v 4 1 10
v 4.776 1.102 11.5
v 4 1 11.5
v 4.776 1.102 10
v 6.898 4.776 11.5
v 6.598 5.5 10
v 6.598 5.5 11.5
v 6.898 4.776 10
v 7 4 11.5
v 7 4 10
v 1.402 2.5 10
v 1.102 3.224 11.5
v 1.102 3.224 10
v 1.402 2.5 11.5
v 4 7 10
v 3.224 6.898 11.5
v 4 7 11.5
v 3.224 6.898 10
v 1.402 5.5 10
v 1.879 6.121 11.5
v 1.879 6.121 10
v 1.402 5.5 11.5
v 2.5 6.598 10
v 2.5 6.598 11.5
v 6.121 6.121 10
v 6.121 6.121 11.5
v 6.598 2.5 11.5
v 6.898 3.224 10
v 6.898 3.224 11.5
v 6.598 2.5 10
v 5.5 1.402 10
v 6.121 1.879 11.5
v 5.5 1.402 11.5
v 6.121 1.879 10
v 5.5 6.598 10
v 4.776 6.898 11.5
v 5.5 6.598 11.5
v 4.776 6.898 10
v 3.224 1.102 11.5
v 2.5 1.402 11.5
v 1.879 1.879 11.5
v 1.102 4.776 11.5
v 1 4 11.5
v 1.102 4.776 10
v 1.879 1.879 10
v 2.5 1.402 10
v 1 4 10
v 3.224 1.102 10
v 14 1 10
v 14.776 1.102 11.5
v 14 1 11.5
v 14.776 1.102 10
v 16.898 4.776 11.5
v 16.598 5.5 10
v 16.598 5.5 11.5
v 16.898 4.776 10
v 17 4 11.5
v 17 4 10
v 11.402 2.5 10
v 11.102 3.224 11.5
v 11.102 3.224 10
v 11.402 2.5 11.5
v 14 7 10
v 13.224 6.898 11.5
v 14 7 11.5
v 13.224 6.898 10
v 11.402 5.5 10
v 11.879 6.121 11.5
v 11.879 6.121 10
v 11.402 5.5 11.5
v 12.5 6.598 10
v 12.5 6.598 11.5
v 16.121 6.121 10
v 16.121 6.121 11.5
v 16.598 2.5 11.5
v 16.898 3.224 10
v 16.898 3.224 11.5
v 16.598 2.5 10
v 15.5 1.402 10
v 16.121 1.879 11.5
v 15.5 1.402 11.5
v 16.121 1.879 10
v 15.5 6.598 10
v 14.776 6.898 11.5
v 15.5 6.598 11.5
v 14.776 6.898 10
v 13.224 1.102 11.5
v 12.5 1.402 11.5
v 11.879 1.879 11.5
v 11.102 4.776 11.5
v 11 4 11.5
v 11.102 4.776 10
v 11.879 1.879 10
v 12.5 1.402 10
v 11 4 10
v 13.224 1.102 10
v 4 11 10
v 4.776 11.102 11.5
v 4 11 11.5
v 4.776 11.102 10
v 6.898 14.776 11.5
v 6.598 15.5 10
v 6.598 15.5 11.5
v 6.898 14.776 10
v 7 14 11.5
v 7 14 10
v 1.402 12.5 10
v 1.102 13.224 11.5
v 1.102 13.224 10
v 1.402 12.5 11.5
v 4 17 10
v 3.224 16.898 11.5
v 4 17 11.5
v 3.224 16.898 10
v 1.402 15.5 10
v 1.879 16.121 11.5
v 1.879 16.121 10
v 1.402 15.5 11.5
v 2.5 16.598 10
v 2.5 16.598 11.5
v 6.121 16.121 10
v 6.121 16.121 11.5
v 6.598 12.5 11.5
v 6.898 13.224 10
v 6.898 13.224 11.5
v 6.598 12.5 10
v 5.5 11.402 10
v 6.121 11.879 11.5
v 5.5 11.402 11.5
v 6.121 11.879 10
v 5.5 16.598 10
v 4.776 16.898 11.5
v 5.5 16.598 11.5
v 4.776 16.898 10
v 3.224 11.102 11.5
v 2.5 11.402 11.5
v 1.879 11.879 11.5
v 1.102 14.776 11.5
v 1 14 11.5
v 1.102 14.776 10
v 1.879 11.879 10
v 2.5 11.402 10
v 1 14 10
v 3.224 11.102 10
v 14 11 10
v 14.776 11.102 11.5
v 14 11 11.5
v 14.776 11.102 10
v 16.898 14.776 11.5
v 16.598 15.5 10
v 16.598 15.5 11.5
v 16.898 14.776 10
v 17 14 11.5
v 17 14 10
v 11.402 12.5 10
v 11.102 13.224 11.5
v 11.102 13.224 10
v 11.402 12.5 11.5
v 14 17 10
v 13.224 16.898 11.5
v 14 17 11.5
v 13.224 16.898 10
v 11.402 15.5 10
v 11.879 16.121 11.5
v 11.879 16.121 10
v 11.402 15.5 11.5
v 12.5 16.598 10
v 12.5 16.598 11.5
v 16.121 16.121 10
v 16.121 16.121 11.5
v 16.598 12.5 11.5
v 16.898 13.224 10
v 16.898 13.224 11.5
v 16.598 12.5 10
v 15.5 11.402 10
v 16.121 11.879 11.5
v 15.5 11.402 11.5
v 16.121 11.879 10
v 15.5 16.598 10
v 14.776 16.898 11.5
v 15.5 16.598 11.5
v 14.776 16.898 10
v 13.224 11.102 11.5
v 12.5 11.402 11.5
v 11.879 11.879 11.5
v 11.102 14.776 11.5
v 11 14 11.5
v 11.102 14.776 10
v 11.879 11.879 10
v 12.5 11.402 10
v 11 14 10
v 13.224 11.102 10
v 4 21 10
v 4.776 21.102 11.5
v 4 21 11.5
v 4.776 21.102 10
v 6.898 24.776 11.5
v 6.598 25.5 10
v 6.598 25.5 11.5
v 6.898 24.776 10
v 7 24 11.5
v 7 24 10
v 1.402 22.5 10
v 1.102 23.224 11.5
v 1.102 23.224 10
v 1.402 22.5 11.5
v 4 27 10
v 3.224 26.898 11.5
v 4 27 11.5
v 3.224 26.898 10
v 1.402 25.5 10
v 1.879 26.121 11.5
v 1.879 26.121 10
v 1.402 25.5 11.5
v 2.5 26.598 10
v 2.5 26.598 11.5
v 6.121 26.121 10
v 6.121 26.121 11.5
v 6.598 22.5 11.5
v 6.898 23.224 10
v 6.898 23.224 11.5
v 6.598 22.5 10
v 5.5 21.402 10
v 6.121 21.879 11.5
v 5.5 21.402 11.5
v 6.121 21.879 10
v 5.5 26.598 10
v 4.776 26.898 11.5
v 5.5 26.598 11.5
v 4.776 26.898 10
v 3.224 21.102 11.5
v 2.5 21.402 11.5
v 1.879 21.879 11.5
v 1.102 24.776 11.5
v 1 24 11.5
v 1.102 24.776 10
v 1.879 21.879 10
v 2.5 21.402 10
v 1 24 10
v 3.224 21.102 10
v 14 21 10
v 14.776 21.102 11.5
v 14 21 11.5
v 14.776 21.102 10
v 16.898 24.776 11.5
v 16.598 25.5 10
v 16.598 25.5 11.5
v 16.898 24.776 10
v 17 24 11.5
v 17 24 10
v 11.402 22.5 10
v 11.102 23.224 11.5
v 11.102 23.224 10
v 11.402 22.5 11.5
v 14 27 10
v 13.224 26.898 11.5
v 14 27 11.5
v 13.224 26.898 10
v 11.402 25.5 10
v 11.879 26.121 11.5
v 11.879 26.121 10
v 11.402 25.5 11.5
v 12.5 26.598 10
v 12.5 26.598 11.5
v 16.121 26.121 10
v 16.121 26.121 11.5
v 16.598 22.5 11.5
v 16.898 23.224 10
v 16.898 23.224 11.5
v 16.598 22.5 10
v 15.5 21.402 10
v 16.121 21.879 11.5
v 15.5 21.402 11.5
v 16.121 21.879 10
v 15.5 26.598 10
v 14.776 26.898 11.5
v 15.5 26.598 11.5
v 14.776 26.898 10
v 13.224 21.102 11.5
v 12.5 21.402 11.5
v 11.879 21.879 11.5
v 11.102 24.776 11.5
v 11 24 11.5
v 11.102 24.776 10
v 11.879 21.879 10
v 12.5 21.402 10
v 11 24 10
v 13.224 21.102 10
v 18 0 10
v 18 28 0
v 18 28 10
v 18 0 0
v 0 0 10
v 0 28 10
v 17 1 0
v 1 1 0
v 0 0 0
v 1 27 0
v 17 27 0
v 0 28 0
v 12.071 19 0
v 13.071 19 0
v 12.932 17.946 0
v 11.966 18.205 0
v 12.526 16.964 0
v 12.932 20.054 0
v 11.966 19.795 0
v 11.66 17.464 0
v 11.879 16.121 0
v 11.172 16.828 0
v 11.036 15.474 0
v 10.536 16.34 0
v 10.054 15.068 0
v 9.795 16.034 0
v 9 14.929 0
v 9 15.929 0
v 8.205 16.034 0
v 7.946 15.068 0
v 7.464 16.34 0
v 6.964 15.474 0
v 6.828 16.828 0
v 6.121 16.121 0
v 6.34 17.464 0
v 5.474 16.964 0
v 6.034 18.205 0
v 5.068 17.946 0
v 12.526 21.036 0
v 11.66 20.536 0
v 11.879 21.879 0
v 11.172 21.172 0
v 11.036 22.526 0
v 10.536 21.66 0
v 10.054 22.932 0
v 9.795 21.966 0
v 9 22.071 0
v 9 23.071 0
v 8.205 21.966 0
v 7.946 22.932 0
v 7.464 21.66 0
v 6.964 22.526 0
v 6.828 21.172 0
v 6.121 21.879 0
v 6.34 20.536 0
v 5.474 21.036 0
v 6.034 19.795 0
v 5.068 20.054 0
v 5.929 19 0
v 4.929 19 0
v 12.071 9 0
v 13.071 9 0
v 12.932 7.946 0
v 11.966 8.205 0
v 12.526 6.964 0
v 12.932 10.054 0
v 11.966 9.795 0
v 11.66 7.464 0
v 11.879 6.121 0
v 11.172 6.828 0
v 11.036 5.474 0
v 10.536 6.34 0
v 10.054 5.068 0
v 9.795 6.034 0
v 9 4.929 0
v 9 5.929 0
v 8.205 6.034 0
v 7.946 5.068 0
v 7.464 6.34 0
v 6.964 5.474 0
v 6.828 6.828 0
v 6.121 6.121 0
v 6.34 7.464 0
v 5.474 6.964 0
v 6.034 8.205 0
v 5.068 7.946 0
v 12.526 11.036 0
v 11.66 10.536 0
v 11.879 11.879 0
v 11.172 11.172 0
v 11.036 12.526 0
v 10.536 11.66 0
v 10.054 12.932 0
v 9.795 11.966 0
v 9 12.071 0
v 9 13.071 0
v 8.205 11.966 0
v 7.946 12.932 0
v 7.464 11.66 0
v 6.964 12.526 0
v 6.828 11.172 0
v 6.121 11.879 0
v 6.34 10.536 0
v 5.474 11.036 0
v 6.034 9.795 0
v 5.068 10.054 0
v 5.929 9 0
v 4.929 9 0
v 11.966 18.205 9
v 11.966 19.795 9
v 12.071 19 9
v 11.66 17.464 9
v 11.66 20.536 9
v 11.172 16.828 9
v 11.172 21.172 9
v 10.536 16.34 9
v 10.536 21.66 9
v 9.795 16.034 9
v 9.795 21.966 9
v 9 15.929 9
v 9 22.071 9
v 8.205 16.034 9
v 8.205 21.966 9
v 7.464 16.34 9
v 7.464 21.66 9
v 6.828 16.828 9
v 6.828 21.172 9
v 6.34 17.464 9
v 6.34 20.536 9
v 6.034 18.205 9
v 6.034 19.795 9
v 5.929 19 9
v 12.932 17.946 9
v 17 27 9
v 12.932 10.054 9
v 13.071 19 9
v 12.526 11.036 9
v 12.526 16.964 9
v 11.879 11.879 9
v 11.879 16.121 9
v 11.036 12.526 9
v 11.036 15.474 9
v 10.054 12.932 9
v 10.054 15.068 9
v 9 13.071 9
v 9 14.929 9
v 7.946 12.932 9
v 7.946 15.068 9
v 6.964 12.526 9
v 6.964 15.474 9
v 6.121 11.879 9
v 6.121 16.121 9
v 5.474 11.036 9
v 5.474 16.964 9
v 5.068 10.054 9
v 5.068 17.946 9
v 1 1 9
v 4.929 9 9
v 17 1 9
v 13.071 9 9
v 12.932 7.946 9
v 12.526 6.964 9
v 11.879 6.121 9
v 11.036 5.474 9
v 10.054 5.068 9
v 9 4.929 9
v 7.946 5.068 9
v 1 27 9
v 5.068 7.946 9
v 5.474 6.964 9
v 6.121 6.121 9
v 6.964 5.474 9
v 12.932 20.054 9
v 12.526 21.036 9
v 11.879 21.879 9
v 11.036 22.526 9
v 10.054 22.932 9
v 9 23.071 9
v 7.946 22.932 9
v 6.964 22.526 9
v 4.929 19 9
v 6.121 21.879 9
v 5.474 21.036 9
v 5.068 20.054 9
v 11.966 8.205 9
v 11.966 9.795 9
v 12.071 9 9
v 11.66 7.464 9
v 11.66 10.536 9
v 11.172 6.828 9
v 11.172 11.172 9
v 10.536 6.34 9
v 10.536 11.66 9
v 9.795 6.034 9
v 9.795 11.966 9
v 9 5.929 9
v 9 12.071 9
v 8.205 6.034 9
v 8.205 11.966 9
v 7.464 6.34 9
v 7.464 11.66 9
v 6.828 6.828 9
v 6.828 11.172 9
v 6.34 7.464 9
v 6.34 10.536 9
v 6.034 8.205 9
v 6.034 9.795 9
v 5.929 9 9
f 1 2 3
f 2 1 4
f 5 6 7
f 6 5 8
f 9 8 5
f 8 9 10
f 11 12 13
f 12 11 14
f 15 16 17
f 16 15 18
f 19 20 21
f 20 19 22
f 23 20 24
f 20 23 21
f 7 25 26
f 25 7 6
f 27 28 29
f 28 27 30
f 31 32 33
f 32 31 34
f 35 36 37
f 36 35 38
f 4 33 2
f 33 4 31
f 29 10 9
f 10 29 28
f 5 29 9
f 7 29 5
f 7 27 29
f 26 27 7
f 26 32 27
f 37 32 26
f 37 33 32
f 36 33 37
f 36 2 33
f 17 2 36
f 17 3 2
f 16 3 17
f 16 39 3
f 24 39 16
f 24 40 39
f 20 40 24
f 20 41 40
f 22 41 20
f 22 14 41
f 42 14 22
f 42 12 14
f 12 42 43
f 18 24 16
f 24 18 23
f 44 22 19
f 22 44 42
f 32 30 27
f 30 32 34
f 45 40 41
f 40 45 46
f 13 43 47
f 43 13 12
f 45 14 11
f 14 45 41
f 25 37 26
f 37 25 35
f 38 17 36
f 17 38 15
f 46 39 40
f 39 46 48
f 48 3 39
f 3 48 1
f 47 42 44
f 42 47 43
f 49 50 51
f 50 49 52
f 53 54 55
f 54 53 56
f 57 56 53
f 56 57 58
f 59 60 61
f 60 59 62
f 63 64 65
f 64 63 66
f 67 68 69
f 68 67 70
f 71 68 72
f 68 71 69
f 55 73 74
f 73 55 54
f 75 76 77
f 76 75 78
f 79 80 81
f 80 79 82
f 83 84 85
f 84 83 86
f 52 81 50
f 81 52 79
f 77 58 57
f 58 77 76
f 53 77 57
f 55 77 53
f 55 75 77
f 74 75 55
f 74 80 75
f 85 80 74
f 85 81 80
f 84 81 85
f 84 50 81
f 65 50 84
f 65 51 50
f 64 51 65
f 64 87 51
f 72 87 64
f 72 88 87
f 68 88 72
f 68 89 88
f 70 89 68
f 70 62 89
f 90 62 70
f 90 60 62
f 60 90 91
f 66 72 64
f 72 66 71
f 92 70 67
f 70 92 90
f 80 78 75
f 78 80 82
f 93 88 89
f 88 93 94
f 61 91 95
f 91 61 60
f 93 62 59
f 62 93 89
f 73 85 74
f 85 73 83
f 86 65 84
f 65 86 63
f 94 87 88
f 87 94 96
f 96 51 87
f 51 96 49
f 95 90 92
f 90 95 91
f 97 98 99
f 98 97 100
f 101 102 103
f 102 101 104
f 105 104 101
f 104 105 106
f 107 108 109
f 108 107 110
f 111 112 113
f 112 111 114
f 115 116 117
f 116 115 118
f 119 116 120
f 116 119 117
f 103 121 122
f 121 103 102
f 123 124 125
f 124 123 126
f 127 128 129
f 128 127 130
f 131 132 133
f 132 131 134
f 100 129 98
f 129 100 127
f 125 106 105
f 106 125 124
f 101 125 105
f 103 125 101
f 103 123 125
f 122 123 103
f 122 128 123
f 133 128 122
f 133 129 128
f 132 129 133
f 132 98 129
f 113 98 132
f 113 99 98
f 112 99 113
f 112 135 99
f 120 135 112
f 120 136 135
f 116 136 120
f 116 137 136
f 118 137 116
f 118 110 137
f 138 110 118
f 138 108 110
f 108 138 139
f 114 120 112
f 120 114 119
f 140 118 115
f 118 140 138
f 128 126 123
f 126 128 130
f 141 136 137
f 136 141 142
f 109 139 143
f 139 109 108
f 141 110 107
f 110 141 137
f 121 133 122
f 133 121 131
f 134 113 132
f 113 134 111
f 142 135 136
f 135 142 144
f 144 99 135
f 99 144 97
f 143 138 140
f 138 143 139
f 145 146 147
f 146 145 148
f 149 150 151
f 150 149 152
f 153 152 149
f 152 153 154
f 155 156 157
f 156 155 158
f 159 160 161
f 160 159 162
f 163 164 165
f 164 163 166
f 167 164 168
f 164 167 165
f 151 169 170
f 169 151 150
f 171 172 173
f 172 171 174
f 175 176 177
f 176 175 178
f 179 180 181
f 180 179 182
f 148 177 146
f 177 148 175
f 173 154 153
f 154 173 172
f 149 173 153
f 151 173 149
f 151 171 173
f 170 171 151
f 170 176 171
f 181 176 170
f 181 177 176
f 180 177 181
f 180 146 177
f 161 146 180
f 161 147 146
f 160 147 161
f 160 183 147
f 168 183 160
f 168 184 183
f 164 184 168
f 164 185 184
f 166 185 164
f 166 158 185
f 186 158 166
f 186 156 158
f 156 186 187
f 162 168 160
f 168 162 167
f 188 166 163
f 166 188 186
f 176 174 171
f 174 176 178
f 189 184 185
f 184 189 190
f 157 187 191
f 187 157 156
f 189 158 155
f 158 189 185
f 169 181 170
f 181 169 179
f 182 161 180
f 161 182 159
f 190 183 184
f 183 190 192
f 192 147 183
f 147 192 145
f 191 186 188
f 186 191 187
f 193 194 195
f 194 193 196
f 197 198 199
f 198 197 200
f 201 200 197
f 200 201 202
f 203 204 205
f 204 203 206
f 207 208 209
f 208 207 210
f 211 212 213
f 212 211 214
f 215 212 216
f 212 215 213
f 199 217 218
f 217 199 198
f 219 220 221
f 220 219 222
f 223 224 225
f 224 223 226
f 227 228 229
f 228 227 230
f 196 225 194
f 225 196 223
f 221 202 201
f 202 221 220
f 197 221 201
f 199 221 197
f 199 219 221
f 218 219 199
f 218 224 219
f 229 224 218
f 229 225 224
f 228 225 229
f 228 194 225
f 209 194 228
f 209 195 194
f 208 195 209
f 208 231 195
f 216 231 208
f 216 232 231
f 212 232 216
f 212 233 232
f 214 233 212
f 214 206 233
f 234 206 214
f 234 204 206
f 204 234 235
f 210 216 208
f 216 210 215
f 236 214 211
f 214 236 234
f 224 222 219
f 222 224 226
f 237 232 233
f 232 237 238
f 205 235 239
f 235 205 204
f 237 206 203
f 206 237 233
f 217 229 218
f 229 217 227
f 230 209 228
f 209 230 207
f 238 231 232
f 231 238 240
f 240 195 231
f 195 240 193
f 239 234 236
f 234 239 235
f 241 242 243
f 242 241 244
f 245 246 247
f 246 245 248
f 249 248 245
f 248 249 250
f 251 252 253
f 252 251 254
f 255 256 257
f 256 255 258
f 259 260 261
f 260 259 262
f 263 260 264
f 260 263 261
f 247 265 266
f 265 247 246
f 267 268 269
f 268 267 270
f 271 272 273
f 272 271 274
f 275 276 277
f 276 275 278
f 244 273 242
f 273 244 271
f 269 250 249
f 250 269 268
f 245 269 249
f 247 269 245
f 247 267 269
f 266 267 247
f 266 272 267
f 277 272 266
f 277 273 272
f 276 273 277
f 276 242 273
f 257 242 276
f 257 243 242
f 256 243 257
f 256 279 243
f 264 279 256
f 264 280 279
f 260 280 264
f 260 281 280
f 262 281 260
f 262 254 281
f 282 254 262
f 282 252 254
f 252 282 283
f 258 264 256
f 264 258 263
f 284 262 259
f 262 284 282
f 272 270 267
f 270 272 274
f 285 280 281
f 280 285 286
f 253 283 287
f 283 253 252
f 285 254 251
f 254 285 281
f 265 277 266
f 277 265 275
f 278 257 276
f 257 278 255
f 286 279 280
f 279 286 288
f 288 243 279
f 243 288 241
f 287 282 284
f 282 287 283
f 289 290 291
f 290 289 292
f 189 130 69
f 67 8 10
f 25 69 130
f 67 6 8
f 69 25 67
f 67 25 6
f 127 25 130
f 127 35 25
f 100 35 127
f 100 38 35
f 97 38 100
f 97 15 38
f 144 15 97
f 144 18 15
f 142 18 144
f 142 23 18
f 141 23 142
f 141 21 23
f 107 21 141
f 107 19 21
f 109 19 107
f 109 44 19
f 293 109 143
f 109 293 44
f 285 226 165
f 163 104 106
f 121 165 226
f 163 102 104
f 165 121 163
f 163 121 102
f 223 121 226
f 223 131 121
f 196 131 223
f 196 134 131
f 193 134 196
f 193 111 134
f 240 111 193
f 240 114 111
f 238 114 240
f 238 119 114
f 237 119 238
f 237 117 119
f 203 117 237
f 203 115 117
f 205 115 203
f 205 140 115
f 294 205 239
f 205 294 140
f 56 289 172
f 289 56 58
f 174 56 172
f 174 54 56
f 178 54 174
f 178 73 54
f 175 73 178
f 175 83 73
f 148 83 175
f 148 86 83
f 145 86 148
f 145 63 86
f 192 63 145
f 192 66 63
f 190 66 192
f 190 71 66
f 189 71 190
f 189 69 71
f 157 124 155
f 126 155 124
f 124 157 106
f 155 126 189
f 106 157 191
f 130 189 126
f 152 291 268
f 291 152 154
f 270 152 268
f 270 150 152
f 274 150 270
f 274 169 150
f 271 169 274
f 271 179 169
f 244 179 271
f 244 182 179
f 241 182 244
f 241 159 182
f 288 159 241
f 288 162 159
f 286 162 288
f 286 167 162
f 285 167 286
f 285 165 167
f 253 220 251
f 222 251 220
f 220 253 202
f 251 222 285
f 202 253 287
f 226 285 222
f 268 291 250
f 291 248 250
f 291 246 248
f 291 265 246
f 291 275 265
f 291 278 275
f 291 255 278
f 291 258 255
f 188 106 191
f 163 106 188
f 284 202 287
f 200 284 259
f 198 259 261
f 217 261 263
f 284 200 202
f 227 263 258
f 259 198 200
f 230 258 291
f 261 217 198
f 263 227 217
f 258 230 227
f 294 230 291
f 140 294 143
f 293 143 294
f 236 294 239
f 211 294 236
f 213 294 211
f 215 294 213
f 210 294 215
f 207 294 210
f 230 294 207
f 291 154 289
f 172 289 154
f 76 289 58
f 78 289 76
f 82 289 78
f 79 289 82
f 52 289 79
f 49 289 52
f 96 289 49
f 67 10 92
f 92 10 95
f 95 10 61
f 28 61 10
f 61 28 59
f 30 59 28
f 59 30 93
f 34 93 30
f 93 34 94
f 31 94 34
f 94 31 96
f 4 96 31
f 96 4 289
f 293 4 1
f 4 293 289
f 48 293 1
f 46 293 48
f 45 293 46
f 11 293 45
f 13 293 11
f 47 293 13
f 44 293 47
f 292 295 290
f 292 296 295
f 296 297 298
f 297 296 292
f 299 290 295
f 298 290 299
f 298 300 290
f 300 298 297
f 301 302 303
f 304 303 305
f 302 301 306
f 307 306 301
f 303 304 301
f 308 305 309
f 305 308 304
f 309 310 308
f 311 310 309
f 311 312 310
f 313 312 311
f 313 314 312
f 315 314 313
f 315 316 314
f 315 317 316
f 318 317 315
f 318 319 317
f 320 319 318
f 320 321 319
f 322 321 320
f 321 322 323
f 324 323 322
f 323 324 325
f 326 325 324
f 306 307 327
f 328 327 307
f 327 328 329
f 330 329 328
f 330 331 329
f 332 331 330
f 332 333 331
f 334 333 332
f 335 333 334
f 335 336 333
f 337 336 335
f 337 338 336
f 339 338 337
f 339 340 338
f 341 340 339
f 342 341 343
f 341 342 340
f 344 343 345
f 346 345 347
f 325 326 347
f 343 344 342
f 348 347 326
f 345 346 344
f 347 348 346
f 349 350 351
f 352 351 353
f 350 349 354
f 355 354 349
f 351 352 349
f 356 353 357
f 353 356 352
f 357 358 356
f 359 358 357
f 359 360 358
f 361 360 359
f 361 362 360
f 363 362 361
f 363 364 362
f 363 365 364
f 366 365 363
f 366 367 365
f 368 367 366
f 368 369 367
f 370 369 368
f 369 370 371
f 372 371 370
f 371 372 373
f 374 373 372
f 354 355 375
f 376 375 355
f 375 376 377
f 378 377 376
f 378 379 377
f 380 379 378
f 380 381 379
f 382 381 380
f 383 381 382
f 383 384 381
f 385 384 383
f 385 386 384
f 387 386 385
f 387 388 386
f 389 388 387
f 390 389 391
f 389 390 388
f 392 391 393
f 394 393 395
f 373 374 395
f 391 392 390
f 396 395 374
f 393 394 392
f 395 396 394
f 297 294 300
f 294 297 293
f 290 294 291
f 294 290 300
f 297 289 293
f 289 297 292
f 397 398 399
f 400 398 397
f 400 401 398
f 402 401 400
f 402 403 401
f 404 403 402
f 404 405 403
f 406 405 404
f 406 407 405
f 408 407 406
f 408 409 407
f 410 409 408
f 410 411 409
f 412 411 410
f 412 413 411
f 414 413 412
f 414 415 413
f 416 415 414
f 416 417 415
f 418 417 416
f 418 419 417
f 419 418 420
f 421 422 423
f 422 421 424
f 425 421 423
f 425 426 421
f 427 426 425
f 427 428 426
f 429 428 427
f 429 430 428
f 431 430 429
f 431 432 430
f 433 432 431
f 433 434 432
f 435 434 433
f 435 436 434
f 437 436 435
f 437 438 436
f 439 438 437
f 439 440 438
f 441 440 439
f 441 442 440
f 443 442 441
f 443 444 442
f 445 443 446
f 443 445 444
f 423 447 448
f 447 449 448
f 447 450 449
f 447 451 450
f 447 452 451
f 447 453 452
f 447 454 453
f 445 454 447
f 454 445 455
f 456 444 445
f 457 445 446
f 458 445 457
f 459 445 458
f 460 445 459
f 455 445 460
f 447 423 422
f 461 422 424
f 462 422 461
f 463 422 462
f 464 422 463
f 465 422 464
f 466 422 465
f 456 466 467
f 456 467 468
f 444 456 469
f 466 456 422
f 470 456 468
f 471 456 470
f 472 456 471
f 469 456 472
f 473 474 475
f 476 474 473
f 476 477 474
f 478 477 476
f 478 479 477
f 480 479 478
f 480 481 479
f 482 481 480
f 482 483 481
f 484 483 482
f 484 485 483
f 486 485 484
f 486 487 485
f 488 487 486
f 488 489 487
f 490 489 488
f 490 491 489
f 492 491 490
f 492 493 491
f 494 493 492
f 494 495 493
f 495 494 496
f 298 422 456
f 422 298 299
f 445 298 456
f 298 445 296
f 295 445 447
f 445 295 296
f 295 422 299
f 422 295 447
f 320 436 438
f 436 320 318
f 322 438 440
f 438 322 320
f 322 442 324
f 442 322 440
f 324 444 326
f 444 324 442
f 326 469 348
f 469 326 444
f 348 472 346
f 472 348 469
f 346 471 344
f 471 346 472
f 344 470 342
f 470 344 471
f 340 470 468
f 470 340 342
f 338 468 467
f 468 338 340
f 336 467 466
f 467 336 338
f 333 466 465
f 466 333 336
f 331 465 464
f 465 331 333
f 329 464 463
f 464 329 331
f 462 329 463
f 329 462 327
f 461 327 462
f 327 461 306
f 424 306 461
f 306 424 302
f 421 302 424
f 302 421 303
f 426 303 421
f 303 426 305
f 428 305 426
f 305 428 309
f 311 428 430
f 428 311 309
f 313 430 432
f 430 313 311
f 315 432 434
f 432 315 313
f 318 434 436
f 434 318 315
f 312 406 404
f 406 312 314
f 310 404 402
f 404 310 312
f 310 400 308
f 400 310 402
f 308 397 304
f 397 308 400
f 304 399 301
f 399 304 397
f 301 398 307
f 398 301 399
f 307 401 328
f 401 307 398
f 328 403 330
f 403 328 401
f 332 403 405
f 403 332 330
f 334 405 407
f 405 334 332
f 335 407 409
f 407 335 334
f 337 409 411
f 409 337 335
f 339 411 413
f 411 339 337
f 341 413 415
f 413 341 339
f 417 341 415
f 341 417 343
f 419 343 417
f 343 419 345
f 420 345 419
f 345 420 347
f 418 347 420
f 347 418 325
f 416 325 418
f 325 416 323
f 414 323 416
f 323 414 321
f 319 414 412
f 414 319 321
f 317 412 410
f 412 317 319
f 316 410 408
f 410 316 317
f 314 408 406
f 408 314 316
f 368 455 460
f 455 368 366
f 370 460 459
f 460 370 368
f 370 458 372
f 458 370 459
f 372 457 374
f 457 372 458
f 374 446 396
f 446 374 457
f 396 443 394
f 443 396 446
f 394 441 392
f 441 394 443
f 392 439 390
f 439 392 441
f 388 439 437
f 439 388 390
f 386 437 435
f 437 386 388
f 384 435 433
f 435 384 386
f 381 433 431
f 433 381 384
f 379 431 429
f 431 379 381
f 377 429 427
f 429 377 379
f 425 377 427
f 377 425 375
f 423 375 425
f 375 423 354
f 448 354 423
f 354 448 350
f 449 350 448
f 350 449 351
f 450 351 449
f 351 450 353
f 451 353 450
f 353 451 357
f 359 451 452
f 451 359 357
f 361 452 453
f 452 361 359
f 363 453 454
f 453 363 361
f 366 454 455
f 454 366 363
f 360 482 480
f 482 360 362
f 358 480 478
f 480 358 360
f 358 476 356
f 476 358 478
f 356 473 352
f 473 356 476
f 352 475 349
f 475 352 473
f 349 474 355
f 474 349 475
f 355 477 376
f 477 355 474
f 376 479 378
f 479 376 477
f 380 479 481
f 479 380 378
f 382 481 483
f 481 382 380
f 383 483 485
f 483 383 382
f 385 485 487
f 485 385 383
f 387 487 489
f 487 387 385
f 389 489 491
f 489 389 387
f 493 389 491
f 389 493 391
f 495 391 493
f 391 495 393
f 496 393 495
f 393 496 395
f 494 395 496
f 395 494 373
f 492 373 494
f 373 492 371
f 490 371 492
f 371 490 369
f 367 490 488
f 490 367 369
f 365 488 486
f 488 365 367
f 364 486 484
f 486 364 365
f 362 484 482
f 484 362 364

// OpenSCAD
// configured variables
wallThickness = 1;
brickDepth = 10.0;
// bop is thing on top
// doot is thing on bottom that fits between the bops
bopRadius = 3.0;
bopDepth = 1.5;
bopSpace = 2.0; // on each side (think radius)
bopsX = 2;
bopsY = 3;

// calculated values
bopC2C = 2*(bopRadius + bopSpace);
bopFirstCenter = wallThickness + bopRadius;
dootRadius = sqrt(2)*bopSpace + sqrt(2)*bopRadius - bopRadius;
dootFirstCenter = bopFirstCenter + bopC2C/2;
dootC2C = bopC2C;
brickX = 2*wallThickness + (bopsX-1)*bopC2C + 2*bopRadius;
brickY = 2*wallThickness + (bopsY-1)*bopC2C + 2*bopRadius;

// variables that affect rendering
off = 0.001; // offset for previewing floor. larger values cause doots to look weird
$fn = 24; // resolution of circles

module bop(pos) {
    x = bopFirstCenter+bopC2C*pos[0];
    y = bopFirstCenter+bopC2C*pos[1];
    translate([x,y,brickDepth-(wallThickness/2)])
    cylinder(r=bopRadius,h=bopDepth+(wallThickness/2));
}

module doot(pos) {
    x = dootFirstCenter+dootC2C*pos[0];
    y = dootFirstCenter+dootC2C*pos[1];
    translate([x,y,0])
    difference() {
        circle(r=dootRadius);
        circle(r=dootRadius-wallThickness);
    }
}

// bops
for(j=[0:bopsY-1]){
        for(i=[0:bopsX-1]){
            bop([i,j]);
    }
}

// brick
difference() {
    // walls
    cube([brickX,brickY,brickDepth]);
    // carve out hollow parts
    translate([0,0,-off])
    linear_extrude(height=brickDepth-wallThickness+off)
    difference() {
        // profile of brick minus walls
        translate([wallThickness,wallThickness])
        square([brickX - 2*wallThickness,
            brickY - 2*wallThickness]);
        // doots
        for(j=[0:bopsY-2]){ 
                for(i=[0:bopsX-2]){
                    doot([i,j]);
            }
        }
    };
}
